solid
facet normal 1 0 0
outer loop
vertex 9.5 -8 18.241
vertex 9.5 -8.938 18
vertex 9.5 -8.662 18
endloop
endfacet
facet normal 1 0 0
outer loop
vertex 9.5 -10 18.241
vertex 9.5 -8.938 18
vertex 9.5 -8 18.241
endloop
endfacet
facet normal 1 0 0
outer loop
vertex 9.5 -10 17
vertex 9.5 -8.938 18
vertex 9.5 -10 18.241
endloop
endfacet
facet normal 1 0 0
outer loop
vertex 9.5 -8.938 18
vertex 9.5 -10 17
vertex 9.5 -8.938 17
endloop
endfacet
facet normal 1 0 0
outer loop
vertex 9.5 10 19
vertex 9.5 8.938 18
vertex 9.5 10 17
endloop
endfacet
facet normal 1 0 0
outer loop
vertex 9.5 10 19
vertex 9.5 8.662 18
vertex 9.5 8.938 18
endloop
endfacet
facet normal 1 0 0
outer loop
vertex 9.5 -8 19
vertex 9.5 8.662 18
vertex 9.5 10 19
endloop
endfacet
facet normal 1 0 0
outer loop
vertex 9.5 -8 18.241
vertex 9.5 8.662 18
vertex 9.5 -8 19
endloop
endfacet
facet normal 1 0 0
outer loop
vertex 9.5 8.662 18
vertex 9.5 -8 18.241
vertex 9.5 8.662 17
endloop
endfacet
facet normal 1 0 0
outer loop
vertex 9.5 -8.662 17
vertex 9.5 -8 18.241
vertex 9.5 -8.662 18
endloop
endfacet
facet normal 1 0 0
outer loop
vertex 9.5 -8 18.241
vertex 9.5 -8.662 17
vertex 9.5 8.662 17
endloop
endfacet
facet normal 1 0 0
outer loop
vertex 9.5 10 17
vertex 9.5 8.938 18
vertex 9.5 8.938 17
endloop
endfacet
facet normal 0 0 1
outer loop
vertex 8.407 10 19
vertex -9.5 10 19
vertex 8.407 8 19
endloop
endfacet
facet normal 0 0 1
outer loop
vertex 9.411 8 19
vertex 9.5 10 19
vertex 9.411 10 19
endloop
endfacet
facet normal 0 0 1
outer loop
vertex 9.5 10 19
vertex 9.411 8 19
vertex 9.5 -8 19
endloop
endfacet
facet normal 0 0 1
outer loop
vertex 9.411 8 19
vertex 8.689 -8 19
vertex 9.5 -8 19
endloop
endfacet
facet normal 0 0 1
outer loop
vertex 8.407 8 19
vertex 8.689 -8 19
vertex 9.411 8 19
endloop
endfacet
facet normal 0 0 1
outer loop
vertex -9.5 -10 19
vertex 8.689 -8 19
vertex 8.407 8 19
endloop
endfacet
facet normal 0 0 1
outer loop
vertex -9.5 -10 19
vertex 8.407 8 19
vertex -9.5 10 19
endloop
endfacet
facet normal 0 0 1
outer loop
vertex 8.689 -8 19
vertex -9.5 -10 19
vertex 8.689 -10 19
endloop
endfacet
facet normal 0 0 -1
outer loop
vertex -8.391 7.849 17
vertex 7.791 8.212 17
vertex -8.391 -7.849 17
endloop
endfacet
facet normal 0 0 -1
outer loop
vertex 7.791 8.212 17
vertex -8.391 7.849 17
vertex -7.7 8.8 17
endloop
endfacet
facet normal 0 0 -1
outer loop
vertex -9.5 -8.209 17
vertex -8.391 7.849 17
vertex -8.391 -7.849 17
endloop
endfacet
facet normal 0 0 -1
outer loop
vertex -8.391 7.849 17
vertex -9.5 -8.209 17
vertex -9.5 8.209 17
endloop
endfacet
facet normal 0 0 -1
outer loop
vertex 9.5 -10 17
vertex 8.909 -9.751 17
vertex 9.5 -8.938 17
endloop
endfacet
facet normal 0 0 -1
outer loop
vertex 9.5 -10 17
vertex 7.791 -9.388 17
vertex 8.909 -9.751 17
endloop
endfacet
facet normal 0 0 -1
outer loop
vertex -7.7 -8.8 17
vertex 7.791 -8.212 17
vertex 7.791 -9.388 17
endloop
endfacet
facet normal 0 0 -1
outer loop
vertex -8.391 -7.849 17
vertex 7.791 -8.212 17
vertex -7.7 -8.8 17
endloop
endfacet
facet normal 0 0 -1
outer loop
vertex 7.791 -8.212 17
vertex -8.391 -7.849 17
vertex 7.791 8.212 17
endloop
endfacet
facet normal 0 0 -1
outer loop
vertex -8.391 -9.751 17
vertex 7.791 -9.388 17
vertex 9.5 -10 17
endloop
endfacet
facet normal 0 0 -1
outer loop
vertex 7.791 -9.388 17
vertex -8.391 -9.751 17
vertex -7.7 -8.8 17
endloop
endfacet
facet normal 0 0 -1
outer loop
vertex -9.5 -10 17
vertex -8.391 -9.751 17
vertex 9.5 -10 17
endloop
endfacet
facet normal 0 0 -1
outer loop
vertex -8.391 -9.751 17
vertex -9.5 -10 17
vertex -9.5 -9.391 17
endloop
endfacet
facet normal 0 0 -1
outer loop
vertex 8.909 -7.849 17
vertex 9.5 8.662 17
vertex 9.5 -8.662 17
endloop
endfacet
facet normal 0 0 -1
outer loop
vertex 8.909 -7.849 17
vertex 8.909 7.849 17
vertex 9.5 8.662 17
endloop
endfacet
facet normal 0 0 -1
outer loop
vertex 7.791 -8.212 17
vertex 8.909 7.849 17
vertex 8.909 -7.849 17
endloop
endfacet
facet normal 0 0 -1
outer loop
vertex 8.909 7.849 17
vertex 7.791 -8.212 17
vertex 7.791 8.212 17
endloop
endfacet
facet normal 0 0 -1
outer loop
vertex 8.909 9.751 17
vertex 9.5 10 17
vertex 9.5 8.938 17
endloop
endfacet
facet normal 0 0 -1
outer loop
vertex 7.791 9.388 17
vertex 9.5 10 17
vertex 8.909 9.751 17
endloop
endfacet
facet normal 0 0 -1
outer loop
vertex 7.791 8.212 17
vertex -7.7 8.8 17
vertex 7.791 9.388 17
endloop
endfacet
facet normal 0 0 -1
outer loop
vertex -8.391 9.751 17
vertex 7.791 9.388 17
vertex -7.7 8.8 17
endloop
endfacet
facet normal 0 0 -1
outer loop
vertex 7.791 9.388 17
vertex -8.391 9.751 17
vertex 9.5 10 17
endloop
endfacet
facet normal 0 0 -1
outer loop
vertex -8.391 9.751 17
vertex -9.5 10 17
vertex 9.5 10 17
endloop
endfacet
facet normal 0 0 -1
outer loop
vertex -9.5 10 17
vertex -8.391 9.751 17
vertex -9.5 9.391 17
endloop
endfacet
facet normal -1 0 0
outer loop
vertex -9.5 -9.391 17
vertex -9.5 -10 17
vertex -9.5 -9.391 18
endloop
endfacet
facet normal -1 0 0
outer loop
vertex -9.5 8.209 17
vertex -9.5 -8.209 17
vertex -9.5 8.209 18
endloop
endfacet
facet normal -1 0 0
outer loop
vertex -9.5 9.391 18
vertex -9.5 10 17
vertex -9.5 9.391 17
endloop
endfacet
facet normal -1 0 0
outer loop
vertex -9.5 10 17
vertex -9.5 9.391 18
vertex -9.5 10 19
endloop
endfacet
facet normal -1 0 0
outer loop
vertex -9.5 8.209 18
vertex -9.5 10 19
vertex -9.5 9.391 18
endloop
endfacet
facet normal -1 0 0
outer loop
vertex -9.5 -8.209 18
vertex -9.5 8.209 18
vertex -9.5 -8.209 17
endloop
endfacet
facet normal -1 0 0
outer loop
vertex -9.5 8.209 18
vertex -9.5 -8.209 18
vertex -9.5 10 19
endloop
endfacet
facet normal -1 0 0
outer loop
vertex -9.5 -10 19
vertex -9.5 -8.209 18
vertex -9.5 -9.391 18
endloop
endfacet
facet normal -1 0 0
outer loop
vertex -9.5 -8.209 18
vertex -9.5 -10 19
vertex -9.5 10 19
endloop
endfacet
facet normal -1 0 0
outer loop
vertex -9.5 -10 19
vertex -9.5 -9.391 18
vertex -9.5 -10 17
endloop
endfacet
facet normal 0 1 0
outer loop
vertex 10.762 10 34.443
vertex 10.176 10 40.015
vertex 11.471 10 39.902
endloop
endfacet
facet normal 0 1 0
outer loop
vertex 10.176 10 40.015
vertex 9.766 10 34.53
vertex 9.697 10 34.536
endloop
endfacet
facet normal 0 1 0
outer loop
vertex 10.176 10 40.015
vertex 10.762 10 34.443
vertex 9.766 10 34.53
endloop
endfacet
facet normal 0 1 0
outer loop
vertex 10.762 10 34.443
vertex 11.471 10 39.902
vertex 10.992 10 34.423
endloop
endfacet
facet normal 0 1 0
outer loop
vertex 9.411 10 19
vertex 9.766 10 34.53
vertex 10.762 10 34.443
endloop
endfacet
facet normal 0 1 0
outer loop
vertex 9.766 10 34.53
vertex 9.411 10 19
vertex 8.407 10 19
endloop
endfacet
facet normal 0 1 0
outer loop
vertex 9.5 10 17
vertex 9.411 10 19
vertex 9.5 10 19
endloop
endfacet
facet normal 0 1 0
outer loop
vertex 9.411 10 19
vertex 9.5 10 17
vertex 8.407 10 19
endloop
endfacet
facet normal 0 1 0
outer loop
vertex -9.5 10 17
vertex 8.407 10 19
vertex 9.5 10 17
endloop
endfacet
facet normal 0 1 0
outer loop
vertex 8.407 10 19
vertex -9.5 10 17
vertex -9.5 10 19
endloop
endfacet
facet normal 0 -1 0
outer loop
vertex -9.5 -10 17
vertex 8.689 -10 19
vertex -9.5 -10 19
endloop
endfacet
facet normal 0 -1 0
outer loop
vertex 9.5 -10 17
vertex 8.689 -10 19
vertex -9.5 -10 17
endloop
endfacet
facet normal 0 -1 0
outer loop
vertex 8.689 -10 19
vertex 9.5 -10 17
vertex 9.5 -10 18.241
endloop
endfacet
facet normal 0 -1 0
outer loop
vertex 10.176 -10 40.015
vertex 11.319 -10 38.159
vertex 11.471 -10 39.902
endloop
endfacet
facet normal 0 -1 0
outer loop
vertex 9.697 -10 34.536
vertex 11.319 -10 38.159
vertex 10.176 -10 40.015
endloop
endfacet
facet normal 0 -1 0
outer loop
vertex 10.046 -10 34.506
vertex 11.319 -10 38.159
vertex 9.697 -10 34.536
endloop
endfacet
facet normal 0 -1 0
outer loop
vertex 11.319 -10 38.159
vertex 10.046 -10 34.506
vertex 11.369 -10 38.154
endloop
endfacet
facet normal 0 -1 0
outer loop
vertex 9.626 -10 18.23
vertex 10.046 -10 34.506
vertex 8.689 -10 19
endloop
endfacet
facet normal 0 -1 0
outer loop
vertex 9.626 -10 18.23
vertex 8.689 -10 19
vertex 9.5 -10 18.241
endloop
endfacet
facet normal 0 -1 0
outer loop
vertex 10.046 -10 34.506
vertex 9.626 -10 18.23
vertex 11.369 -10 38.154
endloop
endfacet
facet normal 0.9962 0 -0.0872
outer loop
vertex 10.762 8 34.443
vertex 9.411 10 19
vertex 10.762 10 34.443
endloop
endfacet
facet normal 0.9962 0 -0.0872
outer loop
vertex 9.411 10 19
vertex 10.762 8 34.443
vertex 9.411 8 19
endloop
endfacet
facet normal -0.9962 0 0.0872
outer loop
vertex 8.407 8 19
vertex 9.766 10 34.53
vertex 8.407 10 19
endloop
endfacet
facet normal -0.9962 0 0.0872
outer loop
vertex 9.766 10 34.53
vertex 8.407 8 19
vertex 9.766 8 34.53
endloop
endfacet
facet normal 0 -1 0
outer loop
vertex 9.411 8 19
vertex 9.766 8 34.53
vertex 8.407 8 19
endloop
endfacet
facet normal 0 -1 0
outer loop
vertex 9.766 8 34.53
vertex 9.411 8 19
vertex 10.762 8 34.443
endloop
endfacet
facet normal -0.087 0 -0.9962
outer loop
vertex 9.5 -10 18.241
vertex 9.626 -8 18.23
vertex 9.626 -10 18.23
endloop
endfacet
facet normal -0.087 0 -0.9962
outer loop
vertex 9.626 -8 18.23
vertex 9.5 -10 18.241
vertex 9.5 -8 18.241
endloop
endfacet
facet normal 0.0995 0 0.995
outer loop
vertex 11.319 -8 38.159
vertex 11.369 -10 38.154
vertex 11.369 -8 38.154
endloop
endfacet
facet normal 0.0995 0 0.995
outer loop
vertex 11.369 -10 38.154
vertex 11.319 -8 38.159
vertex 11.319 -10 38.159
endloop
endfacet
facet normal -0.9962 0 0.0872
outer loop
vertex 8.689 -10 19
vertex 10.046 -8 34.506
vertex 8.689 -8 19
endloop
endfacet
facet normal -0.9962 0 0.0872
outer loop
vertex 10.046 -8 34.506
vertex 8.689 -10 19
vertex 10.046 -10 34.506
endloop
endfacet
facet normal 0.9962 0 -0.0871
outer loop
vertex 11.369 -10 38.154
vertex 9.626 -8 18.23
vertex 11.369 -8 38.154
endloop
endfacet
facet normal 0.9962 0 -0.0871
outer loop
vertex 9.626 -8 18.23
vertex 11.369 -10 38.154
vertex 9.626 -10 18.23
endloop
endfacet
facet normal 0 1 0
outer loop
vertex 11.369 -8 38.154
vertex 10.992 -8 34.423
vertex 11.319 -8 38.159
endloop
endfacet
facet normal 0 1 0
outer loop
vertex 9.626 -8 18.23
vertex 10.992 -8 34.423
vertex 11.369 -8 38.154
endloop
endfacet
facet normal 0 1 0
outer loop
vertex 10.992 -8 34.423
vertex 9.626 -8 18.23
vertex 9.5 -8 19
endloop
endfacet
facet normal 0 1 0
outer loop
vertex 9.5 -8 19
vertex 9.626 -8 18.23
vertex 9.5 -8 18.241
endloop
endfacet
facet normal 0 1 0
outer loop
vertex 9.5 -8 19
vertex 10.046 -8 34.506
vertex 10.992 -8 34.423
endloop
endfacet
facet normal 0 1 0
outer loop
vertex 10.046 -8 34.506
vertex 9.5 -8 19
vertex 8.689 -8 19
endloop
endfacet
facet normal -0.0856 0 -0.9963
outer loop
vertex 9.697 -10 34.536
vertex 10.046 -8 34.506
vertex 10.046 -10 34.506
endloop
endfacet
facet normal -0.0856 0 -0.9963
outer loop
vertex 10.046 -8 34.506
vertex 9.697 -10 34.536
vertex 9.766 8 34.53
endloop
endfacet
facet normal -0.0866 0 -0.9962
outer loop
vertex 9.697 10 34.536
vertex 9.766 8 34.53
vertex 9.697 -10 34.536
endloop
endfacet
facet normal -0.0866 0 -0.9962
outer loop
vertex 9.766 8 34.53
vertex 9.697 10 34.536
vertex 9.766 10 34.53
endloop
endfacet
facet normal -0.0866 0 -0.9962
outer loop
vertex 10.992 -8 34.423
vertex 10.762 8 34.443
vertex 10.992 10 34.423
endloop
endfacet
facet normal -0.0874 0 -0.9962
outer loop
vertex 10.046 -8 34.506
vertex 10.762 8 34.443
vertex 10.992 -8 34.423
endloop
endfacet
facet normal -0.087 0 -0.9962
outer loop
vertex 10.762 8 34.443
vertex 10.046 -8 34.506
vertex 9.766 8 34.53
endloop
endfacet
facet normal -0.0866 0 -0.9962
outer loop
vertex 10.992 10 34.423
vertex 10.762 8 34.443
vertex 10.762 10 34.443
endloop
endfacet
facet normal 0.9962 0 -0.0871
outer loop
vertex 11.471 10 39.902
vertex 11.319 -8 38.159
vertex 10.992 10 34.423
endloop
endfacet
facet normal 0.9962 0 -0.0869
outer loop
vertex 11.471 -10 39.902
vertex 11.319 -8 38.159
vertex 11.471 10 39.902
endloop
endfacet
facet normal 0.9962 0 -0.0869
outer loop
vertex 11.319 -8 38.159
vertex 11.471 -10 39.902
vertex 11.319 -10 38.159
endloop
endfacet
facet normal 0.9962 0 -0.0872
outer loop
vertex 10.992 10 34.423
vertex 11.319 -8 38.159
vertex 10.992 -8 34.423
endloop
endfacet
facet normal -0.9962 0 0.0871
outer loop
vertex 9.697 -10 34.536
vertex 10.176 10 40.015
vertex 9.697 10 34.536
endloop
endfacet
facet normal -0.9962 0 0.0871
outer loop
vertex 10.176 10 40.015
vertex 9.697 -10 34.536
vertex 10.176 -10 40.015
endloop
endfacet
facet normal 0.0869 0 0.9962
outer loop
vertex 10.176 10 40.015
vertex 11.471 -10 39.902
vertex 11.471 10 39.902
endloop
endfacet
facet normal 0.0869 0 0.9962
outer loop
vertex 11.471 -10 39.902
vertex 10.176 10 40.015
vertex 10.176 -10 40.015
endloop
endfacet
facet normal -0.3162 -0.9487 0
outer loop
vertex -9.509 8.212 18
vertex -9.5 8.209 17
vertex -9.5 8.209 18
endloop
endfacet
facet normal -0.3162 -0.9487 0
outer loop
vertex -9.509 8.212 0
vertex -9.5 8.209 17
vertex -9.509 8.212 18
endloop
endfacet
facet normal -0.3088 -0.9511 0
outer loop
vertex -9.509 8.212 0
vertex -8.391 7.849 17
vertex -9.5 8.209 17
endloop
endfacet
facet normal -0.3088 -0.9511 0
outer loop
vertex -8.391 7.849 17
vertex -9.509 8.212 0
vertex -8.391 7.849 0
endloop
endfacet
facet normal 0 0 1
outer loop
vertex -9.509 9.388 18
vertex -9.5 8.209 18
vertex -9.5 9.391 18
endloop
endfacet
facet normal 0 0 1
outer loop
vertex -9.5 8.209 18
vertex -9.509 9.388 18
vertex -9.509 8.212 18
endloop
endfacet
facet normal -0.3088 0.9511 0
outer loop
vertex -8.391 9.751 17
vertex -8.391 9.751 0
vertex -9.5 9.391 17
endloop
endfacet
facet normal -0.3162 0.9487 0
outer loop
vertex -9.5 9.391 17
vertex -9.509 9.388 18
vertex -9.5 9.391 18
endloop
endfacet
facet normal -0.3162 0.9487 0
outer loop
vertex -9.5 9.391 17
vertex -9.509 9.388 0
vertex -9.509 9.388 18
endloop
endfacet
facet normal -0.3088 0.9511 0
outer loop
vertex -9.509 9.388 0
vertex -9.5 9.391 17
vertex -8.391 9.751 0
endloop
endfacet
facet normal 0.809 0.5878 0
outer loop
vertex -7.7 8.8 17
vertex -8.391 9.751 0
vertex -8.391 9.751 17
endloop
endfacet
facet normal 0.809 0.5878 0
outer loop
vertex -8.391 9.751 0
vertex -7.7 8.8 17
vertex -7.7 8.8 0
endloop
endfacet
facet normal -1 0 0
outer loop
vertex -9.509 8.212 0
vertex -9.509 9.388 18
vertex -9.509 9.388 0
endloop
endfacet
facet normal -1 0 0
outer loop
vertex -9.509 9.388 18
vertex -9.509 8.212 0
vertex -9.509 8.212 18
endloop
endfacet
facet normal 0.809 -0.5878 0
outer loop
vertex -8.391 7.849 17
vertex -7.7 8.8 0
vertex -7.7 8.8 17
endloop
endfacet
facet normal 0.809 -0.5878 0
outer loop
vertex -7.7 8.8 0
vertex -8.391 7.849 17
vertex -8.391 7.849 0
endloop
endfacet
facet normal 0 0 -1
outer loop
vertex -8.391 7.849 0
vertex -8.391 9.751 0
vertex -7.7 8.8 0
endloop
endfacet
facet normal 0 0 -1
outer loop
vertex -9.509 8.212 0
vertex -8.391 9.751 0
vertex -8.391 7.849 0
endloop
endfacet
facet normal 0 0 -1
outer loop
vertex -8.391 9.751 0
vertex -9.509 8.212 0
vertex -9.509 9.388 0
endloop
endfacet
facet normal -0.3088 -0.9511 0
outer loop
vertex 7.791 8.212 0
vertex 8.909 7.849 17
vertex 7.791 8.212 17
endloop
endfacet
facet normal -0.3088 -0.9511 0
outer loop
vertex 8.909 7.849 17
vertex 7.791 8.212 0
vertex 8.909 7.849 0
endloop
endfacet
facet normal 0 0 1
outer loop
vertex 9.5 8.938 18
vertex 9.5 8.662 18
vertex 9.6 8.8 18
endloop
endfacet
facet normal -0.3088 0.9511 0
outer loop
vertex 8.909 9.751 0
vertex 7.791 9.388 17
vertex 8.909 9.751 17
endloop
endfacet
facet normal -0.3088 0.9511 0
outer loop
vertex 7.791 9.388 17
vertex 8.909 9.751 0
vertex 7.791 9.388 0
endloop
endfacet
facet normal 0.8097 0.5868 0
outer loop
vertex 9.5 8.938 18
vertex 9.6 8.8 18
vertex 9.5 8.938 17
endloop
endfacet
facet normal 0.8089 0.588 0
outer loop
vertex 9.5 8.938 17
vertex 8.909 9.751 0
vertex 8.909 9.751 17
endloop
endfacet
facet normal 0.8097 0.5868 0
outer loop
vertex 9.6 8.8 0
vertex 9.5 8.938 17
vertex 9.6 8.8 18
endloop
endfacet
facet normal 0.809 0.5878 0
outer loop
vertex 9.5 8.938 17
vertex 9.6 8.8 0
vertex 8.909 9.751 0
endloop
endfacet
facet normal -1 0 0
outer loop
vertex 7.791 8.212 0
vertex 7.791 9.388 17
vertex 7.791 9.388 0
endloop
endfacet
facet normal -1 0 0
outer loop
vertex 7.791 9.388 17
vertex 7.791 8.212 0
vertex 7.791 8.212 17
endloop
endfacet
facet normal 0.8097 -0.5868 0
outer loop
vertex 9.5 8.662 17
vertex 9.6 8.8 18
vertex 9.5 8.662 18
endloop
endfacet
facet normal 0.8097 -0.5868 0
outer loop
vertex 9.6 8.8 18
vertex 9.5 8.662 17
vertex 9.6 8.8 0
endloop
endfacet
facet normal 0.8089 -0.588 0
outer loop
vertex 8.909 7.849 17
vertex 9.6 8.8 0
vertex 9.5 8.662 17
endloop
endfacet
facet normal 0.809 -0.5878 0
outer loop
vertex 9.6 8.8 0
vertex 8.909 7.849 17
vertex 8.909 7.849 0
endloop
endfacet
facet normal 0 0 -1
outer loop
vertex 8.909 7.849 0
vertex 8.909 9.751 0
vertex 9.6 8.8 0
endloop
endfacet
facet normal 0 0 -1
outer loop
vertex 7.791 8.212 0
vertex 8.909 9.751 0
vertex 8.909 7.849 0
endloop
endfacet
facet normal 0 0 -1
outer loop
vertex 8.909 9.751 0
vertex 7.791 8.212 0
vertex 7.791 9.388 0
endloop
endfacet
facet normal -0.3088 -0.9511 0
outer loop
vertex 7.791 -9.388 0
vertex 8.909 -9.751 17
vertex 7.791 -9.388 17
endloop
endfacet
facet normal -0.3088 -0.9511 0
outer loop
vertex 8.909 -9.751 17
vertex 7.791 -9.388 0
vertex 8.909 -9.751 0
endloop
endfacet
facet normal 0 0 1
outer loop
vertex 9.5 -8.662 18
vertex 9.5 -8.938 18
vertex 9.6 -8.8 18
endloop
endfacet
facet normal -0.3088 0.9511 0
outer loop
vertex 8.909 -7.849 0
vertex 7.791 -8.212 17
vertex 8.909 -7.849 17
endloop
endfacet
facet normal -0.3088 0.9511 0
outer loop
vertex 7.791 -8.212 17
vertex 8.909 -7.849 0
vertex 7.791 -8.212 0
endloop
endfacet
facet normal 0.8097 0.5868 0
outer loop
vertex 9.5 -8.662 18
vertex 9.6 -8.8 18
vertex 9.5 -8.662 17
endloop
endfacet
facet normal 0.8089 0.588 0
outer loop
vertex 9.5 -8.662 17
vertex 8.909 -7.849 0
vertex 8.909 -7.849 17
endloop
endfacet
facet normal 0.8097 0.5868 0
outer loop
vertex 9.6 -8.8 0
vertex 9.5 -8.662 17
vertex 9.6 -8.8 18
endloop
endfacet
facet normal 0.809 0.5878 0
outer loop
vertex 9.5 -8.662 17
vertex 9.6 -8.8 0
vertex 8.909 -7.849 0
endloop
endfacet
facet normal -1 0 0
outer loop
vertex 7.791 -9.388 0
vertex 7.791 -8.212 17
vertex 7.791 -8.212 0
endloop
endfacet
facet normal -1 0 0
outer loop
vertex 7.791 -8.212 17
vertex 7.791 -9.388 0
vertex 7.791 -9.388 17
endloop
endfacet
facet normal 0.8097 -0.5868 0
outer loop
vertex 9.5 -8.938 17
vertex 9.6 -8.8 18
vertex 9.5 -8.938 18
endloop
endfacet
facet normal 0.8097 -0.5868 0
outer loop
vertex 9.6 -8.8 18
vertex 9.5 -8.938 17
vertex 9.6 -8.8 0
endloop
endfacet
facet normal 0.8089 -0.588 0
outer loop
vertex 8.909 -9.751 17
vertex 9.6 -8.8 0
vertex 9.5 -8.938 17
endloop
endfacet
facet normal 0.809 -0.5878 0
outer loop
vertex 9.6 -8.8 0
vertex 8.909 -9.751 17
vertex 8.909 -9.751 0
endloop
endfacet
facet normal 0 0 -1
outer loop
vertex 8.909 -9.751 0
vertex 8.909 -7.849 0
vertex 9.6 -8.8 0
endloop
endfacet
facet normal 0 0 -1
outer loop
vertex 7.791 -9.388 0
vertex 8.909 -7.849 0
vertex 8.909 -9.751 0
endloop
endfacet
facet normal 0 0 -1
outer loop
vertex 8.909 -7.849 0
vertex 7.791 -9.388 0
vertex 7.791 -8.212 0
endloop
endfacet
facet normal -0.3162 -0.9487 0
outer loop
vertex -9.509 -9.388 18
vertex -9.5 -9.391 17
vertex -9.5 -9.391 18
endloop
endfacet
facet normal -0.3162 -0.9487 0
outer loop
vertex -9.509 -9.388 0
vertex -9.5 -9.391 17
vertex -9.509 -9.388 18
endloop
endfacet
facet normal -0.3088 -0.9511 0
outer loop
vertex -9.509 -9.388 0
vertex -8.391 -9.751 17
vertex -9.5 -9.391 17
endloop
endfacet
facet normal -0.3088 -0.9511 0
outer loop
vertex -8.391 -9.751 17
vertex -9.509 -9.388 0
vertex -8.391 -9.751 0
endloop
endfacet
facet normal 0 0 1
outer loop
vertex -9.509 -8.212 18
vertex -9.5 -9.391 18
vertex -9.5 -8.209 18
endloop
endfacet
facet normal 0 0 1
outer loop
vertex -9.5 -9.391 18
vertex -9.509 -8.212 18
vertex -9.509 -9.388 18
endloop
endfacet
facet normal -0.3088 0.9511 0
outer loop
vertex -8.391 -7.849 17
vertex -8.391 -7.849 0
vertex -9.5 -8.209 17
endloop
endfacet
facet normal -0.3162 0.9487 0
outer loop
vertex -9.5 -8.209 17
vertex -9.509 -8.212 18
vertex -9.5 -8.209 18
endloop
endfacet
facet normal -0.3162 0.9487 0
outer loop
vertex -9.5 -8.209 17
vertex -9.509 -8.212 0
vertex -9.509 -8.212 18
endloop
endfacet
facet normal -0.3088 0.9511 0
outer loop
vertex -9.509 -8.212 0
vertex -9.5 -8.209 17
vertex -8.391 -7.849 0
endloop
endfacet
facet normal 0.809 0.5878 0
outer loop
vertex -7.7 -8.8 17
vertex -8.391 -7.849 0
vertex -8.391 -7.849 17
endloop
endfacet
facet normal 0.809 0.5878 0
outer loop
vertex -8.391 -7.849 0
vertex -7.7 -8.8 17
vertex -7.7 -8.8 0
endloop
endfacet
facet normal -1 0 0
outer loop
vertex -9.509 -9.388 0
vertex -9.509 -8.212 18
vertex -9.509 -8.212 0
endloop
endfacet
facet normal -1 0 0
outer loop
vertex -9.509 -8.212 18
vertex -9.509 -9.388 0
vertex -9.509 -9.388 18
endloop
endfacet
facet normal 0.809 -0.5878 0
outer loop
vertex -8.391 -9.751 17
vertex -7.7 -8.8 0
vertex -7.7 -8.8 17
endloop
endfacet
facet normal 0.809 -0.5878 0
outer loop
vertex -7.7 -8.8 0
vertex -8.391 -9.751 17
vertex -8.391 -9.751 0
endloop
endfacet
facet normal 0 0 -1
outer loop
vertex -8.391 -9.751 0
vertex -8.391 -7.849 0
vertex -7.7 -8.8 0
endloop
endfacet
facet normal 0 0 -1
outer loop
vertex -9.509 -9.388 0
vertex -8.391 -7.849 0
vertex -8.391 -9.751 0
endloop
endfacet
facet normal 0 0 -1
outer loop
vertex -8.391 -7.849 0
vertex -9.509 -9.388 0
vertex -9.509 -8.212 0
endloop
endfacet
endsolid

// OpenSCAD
translate([0,-0,18])
cube([19 , 20, 2, ], center = true);

translate([10, 0, 20 * sin(90)])


rotate([0, 95, 0]) translate ([-9 ,9 ,-1]) cube([21, 2, 1], center = true);
rotate([0, -85, 0])
translate ([29 ,-9 ,-7.5]) cube([20, 2, 1], center = true);
rotate([0, 95, 0]) translate ([-38 ,0 ,7.3]) cube([5.5, 20, 1.3], center = true);


translate([-8.7, 8.8, 0])


cylinder(r1=1, r2=1, h=18);

translate([8.6,8.8,0])

cylinder(r1=1, r2=1, h=18);

translate([8.6,-8.8,0])

cylinder(r1=1, r2=1, h=18);

translate([-8.7,-8.8,0])

cylinder(r1=1, r2=1, h=18);
